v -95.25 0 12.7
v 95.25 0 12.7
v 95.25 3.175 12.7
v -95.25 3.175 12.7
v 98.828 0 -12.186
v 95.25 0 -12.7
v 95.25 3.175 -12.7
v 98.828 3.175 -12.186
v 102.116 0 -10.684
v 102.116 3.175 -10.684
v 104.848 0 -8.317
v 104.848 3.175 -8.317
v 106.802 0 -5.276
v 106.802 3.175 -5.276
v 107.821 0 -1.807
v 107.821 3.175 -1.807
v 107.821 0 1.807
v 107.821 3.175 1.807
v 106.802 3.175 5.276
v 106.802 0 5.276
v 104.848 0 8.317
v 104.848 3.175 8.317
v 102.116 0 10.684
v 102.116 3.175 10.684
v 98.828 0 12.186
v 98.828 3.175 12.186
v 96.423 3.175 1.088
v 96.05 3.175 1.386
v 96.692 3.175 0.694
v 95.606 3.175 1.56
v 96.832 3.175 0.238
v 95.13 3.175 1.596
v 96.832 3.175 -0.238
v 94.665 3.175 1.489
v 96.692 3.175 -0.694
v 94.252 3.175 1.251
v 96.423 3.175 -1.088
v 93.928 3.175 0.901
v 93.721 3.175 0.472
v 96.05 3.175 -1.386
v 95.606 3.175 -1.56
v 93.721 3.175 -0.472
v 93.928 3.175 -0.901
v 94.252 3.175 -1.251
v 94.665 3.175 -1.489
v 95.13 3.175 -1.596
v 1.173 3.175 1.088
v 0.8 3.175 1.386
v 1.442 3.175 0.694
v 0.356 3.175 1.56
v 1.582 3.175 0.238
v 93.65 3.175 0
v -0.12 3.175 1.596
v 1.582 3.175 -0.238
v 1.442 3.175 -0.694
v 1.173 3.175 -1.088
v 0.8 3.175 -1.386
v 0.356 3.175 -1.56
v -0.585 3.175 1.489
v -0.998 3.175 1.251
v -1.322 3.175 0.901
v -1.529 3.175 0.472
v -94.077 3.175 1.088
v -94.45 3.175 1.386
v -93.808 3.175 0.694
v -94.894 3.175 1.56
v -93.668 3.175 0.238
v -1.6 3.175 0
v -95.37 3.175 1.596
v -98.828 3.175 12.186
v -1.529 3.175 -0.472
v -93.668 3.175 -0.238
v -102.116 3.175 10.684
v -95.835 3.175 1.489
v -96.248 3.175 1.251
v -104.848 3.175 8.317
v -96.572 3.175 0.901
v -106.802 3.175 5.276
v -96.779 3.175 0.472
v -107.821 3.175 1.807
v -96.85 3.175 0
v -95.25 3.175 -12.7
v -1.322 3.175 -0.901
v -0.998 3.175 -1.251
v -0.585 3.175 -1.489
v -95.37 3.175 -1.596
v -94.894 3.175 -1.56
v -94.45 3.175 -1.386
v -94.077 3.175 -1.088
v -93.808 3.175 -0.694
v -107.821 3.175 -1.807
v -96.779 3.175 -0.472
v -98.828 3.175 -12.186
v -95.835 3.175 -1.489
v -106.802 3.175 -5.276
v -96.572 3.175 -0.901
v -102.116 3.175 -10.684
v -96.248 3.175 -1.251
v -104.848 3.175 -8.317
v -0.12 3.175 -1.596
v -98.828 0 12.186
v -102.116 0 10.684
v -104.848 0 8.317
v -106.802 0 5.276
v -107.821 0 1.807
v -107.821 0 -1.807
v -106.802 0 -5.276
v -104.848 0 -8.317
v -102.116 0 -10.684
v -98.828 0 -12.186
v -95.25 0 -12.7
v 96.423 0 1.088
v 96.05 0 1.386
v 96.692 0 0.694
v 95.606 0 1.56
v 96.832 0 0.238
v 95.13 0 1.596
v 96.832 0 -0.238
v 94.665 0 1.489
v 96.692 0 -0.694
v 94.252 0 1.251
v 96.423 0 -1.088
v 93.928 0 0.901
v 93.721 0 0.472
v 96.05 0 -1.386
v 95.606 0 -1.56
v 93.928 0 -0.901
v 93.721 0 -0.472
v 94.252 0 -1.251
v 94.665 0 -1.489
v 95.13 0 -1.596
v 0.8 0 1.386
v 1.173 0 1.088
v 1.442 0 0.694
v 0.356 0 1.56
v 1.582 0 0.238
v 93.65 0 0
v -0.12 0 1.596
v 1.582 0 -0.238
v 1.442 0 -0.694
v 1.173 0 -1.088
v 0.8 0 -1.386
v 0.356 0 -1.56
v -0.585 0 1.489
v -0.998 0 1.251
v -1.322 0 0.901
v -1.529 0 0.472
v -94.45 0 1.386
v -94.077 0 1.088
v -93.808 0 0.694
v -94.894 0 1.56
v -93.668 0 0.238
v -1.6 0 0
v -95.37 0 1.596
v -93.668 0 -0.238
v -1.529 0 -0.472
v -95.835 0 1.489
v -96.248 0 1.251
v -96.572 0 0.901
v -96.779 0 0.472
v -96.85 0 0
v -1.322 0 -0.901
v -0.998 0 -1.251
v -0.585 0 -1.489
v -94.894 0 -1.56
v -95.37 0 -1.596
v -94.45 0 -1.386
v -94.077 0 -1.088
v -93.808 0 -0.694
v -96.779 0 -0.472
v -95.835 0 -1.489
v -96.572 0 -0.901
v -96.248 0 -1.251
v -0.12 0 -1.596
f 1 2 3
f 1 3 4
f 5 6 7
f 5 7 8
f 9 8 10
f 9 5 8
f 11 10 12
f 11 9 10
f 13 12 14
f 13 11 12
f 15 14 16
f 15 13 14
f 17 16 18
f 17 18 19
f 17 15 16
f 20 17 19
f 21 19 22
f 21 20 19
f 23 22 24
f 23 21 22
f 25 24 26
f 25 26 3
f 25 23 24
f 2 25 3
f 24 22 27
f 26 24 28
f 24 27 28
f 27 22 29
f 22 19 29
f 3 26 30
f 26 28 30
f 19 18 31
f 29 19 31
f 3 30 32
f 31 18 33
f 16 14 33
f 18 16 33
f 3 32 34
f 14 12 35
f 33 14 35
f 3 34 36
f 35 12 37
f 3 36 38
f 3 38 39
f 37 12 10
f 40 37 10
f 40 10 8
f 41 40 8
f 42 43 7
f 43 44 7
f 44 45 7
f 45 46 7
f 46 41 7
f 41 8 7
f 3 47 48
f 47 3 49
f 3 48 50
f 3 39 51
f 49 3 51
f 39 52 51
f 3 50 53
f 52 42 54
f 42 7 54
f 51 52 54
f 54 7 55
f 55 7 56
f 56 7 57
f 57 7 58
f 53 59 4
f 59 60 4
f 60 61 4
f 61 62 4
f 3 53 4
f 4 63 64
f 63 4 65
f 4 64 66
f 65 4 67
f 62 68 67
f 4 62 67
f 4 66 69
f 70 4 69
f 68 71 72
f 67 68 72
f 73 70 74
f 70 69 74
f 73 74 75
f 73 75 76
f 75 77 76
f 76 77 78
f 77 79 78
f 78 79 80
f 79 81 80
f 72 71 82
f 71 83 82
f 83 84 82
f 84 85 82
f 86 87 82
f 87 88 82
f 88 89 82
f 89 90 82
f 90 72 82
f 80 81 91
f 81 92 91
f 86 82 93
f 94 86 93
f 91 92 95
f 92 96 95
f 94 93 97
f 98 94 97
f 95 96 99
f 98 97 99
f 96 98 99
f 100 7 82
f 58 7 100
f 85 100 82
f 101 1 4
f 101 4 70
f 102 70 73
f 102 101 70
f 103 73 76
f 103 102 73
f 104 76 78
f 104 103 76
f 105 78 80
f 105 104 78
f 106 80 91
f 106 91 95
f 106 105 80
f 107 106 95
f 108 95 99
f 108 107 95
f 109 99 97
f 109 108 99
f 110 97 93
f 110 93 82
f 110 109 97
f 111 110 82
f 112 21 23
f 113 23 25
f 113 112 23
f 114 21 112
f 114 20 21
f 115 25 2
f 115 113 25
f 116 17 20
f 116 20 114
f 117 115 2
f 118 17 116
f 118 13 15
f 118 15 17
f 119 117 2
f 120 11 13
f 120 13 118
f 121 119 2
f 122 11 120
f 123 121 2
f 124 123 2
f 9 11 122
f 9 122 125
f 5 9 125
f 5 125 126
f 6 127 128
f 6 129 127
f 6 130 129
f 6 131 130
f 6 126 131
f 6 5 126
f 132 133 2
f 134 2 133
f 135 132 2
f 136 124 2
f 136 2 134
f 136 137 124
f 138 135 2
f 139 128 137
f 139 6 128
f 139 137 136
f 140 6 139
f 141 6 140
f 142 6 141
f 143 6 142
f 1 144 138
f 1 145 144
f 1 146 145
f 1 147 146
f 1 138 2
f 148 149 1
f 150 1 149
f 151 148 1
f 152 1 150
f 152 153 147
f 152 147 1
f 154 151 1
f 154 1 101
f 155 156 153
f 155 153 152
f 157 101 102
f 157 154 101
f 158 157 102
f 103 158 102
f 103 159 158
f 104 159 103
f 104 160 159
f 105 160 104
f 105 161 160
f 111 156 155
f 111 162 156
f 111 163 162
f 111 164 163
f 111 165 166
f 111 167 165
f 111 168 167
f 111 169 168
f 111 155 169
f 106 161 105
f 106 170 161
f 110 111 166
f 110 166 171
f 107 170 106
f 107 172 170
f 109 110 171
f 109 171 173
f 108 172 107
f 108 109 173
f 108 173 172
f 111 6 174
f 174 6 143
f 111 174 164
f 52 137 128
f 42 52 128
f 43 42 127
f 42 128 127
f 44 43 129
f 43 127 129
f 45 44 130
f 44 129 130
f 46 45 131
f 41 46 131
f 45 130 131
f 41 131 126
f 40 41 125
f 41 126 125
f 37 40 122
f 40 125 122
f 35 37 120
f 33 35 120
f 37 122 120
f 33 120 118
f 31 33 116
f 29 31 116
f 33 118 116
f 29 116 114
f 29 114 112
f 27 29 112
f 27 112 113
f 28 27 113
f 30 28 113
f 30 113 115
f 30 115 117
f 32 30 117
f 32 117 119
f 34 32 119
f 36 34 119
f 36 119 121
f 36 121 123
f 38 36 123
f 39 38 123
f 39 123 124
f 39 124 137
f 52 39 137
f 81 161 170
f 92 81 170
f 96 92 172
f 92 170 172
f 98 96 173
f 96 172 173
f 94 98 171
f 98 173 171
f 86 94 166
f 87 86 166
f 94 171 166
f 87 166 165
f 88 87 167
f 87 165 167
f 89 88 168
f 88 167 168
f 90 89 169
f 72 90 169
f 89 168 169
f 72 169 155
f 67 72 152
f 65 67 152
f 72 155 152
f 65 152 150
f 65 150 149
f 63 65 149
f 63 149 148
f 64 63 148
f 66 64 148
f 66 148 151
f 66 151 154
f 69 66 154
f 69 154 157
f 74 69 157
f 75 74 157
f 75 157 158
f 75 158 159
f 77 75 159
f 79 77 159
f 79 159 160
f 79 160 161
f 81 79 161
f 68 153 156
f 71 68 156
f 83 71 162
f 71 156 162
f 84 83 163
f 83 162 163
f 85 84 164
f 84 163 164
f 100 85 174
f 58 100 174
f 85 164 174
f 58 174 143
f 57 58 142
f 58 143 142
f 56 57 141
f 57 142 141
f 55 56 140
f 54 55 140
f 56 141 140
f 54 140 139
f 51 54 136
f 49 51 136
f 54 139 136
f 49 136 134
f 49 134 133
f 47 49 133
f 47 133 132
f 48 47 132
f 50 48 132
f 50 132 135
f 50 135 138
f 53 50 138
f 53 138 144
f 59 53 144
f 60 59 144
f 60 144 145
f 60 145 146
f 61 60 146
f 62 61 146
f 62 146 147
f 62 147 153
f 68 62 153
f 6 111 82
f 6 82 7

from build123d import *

# Parameters (mm, degrees)
BOSS_EXTRUDE1_DEPTH  = 3.175
M3_CLEARANCE_HOLE1_D = 3.2


with BuildPart() as part:
    # Sketch1 → Boss-Extrude1 (new body)
    with BuildSketch(Plane(origin=(0, 0, 0), x_dir=(1, 0, 0), z_dir=(0, 1, 0))):
        with BuildLine():
            Line((-95.25, 12.7), (95.25, 12.7))
            ThreePointArc((95.25, 12.7), (107.95, 0), (95.25, -12.7))
            Line((95.25, -12.7), (-95.25, -12.7))
            ThreePointArc((-95.25, -12.7), (-107.95, 0), (-95.25, 12.7))
        make_face()
    extrude(amount=BOSS_EXTRUDE1_DEPTH)

    # M3 Clearance Hole1 (through all)
    with Locations(Plane(origin=(0, 3.175, 0), x_dir=(1, 0, 0), z_dir=(0, 1, 0))):
        with Locations((-95.25, 0), (0, 0), (95.25, 0)):
            Hole(M3_CLEARANCE_HOLE1_D / 2)


solid = part.part
